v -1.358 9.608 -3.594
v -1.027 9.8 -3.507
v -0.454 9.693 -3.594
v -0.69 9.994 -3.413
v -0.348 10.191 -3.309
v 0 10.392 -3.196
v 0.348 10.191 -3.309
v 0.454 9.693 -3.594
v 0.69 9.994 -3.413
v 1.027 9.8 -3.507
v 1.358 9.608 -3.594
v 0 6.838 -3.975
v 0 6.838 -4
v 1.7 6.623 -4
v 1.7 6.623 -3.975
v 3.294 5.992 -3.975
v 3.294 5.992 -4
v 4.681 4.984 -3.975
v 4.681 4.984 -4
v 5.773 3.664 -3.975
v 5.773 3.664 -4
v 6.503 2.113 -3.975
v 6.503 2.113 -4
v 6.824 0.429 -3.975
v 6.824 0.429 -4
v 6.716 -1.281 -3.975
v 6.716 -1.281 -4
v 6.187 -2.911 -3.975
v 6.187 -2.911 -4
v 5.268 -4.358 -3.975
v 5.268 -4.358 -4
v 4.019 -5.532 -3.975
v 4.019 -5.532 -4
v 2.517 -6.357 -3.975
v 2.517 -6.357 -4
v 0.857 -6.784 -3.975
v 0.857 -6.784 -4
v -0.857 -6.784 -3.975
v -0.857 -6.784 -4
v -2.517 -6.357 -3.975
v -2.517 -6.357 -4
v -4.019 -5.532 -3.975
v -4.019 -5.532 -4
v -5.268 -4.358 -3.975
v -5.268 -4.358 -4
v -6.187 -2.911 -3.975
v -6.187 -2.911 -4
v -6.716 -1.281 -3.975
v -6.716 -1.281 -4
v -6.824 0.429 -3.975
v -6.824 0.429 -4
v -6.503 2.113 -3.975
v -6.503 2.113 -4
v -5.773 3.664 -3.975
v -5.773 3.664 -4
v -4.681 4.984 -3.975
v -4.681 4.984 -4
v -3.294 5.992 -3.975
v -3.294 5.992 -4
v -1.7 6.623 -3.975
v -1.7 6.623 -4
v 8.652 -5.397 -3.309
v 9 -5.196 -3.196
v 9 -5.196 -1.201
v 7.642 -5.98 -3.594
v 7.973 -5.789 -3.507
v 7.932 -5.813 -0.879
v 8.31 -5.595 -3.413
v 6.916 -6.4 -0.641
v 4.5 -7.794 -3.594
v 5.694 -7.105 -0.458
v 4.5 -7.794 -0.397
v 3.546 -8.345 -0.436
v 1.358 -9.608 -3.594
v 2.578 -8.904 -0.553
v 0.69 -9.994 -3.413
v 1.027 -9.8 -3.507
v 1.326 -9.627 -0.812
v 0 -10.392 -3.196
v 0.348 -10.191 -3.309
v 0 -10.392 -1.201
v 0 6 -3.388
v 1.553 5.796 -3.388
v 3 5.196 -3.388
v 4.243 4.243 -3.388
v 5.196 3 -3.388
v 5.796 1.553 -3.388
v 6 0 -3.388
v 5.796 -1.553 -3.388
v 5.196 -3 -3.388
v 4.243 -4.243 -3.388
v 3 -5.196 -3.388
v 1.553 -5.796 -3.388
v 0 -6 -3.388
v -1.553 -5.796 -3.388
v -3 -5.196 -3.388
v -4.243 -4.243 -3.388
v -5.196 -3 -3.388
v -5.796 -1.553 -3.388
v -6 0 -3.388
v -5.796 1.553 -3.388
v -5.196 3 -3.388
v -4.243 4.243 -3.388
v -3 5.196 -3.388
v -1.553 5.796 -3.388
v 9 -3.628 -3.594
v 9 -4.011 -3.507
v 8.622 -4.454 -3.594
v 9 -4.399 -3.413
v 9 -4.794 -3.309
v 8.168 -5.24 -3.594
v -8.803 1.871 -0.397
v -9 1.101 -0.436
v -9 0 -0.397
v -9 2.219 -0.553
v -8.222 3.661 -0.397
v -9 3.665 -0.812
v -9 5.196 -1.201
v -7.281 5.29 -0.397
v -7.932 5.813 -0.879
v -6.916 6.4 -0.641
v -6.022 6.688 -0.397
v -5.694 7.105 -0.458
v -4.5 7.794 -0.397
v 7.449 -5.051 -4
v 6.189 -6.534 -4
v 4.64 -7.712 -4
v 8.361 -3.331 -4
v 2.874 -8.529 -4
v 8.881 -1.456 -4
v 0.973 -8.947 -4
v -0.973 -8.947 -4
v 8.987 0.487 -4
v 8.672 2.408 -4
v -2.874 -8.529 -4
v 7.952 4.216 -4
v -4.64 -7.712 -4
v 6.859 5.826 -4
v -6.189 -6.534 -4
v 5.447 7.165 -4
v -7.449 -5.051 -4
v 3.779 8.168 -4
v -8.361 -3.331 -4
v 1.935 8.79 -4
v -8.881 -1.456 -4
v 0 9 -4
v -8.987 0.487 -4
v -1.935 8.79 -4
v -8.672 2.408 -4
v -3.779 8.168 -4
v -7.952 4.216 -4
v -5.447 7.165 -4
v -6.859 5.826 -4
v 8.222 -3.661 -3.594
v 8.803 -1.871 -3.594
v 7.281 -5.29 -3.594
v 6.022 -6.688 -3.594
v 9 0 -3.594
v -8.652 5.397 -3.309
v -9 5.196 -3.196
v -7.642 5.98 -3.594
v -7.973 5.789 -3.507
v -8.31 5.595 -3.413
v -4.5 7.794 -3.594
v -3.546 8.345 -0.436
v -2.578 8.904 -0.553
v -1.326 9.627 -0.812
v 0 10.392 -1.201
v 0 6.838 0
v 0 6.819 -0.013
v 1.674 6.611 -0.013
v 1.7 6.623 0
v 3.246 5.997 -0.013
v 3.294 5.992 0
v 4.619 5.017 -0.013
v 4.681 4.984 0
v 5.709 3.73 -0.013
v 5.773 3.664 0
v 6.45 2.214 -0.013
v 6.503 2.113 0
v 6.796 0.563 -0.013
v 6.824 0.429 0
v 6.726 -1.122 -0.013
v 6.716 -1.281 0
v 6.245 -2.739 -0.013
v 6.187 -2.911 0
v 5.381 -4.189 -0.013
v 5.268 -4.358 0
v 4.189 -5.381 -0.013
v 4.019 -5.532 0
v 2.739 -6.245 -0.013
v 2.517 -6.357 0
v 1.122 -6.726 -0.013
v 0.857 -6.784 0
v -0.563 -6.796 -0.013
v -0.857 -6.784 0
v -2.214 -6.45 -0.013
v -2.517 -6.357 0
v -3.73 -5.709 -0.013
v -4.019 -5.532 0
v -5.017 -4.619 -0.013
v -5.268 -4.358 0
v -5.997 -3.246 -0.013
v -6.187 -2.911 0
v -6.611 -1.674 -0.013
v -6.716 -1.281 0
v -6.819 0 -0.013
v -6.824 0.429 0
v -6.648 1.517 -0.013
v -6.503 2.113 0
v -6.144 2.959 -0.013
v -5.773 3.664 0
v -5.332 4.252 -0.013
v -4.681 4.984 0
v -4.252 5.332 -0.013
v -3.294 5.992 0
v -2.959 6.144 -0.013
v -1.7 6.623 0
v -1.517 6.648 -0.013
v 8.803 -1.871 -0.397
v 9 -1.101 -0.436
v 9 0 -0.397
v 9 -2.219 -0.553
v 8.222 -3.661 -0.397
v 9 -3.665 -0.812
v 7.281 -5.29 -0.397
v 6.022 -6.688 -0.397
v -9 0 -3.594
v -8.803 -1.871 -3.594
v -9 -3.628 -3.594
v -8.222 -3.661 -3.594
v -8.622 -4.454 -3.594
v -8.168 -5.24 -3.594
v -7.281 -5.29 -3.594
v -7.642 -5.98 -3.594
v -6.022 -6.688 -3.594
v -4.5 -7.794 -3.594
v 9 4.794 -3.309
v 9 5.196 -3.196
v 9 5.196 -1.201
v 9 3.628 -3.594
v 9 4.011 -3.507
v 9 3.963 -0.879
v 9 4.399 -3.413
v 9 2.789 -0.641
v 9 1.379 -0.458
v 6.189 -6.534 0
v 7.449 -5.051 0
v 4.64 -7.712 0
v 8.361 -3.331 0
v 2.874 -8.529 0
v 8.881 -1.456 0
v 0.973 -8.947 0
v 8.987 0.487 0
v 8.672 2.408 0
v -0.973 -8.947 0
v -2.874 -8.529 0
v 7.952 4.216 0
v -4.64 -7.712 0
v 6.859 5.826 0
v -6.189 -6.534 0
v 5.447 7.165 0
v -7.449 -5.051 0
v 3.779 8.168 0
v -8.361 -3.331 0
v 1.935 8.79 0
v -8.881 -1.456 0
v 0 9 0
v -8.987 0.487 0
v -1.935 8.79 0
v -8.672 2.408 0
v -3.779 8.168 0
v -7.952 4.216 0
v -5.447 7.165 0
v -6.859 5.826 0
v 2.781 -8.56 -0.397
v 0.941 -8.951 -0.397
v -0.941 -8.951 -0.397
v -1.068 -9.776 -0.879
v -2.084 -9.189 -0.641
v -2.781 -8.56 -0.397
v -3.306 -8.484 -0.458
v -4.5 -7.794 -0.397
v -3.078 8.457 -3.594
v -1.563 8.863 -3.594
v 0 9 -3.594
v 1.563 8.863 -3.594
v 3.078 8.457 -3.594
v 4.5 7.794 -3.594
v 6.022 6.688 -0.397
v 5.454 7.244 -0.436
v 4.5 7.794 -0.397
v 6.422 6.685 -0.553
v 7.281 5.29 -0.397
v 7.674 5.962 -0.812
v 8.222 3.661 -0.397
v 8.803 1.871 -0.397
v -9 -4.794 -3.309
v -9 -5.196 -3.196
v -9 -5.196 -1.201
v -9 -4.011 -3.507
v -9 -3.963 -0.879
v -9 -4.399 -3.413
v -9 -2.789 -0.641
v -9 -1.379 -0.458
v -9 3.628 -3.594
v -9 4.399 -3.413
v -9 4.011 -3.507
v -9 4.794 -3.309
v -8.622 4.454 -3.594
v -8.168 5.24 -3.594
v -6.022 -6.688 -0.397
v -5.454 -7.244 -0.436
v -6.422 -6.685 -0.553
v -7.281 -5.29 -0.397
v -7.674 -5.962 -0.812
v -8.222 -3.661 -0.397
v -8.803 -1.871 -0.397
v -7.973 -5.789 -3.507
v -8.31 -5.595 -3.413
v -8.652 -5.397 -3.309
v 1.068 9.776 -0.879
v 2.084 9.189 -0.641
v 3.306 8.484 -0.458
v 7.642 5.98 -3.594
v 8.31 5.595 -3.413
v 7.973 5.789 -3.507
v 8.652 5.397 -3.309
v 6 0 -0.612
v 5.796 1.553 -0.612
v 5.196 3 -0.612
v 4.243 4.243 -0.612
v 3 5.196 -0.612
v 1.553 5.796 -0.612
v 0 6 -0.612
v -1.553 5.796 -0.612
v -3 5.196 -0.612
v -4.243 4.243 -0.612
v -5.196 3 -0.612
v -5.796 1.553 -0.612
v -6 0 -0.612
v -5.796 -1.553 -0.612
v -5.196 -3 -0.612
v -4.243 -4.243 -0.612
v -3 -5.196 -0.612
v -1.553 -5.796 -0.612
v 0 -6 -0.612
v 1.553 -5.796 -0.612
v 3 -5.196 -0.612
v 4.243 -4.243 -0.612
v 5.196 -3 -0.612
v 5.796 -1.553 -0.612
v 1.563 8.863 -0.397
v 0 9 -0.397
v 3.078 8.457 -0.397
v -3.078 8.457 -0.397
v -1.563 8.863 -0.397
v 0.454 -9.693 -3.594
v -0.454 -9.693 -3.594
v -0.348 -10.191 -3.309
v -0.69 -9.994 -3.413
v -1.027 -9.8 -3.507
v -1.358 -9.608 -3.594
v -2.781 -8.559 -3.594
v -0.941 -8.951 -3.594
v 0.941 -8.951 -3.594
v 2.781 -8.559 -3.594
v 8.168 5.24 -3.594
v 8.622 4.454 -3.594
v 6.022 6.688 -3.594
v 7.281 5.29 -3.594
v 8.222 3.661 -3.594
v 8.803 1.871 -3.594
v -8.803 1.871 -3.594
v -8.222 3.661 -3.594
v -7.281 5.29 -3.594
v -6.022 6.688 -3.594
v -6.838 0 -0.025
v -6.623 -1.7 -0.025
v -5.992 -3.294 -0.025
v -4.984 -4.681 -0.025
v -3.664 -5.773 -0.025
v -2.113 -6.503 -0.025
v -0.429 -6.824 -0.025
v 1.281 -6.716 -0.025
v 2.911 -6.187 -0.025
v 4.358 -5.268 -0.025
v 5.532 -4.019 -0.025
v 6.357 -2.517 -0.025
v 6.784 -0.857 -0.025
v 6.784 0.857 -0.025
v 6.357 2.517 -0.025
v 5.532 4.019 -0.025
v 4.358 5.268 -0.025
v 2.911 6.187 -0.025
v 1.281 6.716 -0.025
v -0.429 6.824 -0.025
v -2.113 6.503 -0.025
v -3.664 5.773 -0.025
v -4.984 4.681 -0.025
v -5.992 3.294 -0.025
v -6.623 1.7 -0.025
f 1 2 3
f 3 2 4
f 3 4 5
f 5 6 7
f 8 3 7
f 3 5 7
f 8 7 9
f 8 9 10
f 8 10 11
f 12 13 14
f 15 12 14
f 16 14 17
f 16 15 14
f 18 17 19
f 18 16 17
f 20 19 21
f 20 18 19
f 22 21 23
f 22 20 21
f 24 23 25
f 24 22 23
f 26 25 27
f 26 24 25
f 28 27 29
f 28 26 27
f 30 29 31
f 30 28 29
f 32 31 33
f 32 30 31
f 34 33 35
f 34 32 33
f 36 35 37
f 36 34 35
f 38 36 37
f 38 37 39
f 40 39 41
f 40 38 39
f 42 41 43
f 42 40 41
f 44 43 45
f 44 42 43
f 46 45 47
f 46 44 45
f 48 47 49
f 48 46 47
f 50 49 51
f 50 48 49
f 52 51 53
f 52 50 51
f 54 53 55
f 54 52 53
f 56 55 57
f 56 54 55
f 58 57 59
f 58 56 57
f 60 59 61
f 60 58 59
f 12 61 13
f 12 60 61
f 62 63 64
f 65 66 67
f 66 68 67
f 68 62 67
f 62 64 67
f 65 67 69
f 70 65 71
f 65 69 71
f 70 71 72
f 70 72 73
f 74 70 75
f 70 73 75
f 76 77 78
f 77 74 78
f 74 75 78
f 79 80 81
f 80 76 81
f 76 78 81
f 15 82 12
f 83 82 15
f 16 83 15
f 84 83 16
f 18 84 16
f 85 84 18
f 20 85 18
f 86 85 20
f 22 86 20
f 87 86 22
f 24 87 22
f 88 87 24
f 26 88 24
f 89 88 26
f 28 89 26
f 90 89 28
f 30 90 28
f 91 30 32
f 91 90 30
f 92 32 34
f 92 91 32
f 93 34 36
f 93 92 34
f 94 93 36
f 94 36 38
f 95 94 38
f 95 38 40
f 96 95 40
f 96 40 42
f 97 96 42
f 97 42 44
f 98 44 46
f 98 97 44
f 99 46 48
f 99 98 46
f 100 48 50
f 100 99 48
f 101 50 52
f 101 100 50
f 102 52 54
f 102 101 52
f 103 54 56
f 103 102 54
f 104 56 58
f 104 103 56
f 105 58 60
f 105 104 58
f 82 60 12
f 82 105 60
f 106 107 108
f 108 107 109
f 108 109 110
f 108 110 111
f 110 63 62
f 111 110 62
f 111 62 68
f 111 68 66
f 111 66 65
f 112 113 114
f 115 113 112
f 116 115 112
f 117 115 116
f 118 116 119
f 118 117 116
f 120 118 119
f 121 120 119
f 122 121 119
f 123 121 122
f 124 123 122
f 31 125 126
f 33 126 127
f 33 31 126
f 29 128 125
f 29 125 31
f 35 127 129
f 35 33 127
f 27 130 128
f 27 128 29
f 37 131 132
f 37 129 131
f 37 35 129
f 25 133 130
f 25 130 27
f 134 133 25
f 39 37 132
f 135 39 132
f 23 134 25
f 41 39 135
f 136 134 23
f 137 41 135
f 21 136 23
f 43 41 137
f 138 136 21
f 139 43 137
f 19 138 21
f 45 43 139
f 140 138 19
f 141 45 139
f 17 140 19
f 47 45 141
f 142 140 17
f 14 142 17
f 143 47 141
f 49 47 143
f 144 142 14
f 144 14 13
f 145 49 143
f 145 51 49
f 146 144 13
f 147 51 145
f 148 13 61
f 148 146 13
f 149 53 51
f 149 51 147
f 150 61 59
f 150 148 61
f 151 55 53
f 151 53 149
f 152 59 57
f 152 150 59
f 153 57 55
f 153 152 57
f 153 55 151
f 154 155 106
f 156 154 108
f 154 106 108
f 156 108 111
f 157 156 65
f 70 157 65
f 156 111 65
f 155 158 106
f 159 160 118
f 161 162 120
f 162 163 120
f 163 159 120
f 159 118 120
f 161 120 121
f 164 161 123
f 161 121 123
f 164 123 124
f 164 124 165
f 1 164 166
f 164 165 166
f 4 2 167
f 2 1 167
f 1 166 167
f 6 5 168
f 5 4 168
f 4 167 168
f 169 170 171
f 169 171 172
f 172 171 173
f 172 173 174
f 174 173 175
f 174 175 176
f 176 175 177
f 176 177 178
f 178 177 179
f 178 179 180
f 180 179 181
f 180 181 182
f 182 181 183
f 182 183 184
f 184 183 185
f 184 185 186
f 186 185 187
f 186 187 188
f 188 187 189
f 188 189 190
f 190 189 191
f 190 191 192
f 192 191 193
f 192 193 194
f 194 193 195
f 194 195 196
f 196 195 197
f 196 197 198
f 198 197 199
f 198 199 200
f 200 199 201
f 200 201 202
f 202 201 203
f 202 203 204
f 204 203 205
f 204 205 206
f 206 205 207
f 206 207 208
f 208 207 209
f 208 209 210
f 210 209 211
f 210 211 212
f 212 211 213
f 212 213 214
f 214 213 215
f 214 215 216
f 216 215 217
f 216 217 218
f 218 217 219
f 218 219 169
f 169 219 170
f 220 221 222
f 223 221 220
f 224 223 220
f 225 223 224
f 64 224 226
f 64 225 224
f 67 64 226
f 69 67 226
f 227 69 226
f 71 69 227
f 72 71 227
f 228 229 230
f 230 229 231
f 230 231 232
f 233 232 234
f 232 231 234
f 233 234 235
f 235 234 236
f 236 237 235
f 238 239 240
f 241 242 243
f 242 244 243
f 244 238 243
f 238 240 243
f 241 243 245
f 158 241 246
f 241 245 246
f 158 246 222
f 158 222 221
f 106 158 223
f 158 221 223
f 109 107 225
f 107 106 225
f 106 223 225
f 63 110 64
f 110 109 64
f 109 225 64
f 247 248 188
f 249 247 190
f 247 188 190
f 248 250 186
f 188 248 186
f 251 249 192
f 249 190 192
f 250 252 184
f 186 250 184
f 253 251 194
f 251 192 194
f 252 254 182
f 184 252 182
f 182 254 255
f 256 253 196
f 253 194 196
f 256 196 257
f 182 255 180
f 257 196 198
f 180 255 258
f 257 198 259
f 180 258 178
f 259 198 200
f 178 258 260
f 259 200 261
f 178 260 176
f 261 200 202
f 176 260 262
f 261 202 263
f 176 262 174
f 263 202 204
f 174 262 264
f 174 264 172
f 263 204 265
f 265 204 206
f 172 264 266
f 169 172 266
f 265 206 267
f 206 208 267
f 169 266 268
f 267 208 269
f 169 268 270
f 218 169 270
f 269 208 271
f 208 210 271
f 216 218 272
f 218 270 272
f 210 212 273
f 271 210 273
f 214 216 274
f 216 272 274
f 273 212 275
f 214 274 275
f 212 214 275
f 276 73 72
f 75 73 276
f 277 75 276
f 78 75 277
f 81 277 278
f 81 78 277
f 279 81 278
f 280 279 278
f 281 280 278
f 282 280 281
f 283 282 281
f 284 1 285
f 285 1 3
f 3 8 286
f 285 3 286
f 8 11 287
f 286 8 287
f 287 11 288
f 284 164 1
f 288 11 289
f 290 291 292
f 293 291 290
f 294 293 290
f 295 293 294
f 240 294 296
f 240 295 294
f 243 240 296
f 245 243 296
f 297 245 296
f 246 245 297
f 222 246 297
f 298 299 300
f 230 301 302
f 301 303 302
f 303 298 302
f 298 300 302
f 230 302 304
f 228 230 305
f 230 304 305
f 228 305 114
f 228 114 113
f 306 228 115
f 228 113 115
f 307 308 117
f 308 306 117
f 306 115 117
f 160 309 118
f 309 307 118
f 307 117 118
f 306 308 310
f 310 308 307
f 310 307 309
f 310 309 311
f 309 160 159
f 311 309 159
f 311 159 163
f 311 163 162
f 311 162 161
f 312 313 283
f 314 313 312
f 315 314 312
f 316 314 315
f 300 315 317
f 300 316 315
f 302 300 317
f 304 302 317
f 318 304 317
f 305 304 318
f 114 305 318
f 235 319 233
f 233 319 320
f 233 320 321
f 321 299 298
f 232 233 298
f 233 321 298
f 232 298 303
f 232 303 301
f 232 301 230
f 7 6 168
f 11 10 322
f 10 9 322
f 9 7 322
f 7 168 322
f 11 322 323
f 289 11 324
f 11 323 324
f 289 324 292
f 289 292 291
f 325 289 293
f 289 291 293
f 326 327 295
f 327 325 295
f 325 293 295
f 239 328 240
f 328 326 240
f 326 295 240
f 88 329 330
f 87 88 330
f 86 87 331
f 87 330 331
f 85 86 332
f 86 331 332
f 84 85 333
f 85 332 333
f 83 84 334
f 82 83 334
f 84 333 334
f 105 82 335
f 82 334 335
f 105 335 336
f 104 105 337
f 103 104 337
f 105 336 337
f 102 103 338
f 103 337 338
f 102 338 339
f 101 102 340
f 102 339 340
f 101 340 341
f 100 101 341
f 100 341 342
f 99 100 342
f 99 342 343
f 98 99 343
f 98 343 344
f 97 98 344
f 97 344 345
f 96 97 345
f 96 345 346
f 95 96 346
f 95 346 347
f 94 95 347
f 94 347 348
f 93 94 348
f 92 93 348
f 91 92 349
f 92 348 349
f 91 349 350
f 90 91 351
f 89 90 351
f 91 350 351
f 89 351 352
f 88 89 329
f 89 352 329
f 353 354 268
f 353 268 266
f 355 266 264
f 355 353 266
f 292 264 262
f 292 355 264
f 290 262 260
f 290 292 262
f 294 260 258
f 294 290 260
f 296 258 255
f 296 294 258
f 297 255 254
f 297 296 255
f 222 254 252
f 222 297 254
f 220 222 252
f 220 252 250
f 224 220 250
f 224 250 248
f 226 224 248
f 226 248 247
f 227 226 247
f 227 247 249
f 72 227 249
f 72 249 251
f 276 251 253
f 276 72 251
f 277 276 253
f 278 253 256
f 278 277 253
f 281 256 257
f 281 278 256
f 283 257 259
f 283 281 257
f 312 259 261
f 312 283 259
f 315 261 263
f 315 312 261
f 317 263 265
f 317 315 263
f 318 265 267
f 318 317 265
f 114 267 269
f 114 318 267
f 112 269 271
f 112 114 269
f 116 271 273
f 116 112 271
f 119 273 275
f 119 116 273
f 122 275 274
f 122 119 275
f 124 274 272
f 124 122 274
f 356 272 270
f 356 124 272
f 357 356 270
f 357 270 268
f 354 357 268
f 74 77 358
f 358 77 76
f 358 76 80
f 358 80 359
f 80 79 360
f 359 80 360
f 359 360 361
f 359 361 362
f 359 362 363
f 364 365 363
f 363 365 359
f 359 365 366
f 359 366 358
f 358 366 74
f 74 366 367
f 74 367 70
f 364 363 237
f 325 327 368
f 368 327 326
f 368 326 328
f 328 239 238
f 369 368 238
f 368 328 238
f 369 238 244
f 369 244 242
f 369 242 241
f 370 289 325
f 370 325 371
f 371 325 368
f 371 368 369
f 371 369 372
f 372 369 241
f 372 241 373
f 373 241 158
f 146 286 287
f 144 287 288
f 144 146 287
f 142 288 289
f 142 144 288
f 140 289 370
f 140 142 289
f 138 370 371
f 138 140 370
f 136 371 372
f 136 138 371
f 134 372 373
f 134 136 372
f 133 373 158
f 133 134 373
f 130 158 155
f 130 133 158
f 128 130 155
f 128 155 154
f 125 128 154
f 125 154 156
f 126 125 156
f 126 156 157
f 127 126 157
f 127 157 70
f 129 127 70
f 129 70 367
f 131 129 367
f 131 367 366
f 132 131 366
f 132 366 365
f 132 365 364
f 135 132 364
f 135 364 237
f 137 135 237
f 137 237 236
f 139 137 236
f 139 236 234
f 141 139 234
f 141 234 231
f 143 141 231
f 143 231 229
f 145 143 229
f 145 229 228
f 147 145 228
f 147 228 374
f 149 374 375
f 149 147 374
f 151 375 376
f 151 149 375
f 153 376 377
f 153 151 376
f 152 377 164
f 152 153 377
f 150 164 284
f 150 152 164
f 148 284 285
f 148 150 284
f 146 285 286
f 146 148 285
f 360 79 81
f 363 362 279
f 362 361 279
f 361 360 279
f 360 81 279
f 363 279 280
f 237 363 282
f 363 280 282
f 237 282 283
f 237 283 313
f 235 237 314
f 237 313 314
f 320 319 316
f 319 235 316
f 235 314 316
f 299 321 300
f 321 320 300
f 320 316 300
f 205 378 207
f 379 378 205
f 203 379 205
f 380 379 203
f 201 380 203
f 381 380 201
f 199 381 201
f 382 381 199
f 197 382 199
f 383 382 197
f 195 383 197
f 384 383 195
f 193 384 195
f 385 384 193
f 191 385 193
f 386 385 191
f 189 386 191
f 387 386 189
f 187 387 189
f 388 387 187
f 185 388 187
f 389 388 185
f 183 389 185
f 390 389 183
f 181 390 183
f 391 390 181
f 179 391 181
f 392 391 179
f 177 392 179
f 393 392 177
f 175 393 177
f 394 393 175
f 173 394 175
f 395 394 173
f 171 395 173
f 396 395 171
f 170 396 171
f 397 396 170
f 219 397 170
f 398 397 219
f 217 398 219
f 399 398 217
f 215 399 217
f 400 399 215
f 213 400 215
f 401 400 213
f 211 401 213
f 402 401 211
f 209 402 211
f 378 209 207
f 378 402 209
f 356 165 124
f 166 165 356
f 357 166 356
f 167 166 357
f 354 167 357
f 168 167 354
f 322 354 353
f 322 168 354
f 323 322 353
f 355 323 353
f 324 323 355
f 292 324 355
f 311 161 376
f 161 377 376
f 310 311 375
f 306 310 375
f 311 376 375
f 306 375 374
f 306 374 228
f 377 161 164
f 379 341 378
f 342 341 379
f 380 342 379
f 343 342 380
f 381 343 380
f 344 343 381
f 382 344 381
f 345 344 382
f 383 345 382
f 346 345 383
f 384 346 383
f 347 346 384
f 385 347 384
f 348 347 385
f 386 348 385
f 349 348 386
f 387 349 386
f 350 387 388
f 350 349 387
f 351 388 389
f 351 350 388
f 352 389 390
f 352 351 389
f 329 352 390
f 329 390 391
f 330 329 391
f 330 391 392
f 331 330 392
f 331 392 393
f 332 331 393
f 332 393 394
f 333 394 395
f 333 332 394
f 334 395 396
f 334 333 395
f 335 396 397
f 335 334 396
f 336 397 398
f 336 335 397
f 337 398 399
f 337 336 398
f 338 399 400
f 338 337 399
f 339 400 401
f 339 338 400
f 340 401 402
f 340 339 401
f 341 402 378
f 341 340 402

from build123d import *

# Parameters (mm, degrees)
BASENUTSKE_R       = 5.25
BASENUT_DEPTH      = 4
SKETCH4_W          = 0.4064
SKETCH4_H          = 11.392304845
SKETCH6_R          = 6
CUT_EXTRUDE1_DEPTH = 10


with BuildPart() as part:
    # BaseNutSke → BaseNut (new body)
    with BuildSketch(Plane.XY):
        Polygon((9, 5.196152423), (9, -5.196152423), (0, -10.392304845), (-9, -5.196152423), (-9, 5.196152423), (0, 10.392304845), align=None)
        Circle(BASENUTSKE_R, mode=Mode.SUBTRACT)
    extrude(amount=-BASENUT_DEPTH)

    # Sketch4 → Bearing-Face (revolve, cut)
    with BuildSketch(Plane(origin=(0, 0, 0), x_dir=(0, 0, -1), z_dir=(1, 0, 0))):
        with Locations((3.7968, 14.696152423)):
            Rectangle(SKETCH4_W, SKETCH4_H)
        Polygon((0, 9), (-10, 9), (-10, 20.392304845), (0.803847577, 20.392304845), (0.803847577, 10.392304845), align=None)
    revolve(axis=Axis((0, 0, 0), (0, 0, -1)), mode=Mode.SUBTRACT)

    # Sketch3 → Double-Chamfer (revolve, cut)
    with BuildSketch(Plane(origin=(0, 0, 0), x_dir=(0, 0, -1), z_dir=(1, 0, 0))):
        Polygon((4, 9), (3.196152423, 10.392304845), (3.196152423, 20.392304845), (14, 20.392304845), (14, 9), align=None)
        Polygon((1.201295155, 20.392304845), (-9.602552423, 20.392304845), (-9.602552423, 9), (0.397447577, 9), (1.201295155, 10.392304845), align=None)
    revolve(axis=Axis((0, 0, 0), (0, 0, -1)), mode=Mode.SUBTRACT)

    # Sketch5 → EndChamfer (revolve, cut)
    with BuildSketch(Plane(origin=(0, 0, 0), x_dir=(0, 0, -1), z_dir=(1, 0, 0))):
        Polygon((3.9746, 6.8375), (2.751862586, 5.09125), (4.0254, 5.09125), (4.0254, 6.8375), align=None)
        Polygon((-0.0508, 6.8375), (0, 6.8375), (1.222737414, 5.09125), (-0.0508, 5.09125), align=None)
    revolve(axis=Axis((0, 0, -25.037505729), (0, 0, -1)), mode=Mode.SUBTRACT)

    # ThdSchSke → ThreadSchematic (revolve, cut)
    with BuildSketch(Plane(origin=(0, 0, 0), x_dir=(1, 0, 0), z_dir=(0, 1, 0))):
        Polygon((-6.8375, 0.0254), (-5.25, 1.136979467), (-2.625, 1.136979467), (-2.625, -1.086179467), (-5.25, -1.086179467), align=None)
    revolve(axis=Axis((0, 0, -3.175), (0, 0, 1)), mode=Mode.SUBTRACT)

    # Sketch6 → Cut-Extrude1 (cut)
    with BuildSketch(Plane.XY):
        Circle(SKETCH6_R)
    extrude(amount=-CUT_EXTRUDE1_DEPTH, mode=Mode.SUBTRACT)


solid = part.part
